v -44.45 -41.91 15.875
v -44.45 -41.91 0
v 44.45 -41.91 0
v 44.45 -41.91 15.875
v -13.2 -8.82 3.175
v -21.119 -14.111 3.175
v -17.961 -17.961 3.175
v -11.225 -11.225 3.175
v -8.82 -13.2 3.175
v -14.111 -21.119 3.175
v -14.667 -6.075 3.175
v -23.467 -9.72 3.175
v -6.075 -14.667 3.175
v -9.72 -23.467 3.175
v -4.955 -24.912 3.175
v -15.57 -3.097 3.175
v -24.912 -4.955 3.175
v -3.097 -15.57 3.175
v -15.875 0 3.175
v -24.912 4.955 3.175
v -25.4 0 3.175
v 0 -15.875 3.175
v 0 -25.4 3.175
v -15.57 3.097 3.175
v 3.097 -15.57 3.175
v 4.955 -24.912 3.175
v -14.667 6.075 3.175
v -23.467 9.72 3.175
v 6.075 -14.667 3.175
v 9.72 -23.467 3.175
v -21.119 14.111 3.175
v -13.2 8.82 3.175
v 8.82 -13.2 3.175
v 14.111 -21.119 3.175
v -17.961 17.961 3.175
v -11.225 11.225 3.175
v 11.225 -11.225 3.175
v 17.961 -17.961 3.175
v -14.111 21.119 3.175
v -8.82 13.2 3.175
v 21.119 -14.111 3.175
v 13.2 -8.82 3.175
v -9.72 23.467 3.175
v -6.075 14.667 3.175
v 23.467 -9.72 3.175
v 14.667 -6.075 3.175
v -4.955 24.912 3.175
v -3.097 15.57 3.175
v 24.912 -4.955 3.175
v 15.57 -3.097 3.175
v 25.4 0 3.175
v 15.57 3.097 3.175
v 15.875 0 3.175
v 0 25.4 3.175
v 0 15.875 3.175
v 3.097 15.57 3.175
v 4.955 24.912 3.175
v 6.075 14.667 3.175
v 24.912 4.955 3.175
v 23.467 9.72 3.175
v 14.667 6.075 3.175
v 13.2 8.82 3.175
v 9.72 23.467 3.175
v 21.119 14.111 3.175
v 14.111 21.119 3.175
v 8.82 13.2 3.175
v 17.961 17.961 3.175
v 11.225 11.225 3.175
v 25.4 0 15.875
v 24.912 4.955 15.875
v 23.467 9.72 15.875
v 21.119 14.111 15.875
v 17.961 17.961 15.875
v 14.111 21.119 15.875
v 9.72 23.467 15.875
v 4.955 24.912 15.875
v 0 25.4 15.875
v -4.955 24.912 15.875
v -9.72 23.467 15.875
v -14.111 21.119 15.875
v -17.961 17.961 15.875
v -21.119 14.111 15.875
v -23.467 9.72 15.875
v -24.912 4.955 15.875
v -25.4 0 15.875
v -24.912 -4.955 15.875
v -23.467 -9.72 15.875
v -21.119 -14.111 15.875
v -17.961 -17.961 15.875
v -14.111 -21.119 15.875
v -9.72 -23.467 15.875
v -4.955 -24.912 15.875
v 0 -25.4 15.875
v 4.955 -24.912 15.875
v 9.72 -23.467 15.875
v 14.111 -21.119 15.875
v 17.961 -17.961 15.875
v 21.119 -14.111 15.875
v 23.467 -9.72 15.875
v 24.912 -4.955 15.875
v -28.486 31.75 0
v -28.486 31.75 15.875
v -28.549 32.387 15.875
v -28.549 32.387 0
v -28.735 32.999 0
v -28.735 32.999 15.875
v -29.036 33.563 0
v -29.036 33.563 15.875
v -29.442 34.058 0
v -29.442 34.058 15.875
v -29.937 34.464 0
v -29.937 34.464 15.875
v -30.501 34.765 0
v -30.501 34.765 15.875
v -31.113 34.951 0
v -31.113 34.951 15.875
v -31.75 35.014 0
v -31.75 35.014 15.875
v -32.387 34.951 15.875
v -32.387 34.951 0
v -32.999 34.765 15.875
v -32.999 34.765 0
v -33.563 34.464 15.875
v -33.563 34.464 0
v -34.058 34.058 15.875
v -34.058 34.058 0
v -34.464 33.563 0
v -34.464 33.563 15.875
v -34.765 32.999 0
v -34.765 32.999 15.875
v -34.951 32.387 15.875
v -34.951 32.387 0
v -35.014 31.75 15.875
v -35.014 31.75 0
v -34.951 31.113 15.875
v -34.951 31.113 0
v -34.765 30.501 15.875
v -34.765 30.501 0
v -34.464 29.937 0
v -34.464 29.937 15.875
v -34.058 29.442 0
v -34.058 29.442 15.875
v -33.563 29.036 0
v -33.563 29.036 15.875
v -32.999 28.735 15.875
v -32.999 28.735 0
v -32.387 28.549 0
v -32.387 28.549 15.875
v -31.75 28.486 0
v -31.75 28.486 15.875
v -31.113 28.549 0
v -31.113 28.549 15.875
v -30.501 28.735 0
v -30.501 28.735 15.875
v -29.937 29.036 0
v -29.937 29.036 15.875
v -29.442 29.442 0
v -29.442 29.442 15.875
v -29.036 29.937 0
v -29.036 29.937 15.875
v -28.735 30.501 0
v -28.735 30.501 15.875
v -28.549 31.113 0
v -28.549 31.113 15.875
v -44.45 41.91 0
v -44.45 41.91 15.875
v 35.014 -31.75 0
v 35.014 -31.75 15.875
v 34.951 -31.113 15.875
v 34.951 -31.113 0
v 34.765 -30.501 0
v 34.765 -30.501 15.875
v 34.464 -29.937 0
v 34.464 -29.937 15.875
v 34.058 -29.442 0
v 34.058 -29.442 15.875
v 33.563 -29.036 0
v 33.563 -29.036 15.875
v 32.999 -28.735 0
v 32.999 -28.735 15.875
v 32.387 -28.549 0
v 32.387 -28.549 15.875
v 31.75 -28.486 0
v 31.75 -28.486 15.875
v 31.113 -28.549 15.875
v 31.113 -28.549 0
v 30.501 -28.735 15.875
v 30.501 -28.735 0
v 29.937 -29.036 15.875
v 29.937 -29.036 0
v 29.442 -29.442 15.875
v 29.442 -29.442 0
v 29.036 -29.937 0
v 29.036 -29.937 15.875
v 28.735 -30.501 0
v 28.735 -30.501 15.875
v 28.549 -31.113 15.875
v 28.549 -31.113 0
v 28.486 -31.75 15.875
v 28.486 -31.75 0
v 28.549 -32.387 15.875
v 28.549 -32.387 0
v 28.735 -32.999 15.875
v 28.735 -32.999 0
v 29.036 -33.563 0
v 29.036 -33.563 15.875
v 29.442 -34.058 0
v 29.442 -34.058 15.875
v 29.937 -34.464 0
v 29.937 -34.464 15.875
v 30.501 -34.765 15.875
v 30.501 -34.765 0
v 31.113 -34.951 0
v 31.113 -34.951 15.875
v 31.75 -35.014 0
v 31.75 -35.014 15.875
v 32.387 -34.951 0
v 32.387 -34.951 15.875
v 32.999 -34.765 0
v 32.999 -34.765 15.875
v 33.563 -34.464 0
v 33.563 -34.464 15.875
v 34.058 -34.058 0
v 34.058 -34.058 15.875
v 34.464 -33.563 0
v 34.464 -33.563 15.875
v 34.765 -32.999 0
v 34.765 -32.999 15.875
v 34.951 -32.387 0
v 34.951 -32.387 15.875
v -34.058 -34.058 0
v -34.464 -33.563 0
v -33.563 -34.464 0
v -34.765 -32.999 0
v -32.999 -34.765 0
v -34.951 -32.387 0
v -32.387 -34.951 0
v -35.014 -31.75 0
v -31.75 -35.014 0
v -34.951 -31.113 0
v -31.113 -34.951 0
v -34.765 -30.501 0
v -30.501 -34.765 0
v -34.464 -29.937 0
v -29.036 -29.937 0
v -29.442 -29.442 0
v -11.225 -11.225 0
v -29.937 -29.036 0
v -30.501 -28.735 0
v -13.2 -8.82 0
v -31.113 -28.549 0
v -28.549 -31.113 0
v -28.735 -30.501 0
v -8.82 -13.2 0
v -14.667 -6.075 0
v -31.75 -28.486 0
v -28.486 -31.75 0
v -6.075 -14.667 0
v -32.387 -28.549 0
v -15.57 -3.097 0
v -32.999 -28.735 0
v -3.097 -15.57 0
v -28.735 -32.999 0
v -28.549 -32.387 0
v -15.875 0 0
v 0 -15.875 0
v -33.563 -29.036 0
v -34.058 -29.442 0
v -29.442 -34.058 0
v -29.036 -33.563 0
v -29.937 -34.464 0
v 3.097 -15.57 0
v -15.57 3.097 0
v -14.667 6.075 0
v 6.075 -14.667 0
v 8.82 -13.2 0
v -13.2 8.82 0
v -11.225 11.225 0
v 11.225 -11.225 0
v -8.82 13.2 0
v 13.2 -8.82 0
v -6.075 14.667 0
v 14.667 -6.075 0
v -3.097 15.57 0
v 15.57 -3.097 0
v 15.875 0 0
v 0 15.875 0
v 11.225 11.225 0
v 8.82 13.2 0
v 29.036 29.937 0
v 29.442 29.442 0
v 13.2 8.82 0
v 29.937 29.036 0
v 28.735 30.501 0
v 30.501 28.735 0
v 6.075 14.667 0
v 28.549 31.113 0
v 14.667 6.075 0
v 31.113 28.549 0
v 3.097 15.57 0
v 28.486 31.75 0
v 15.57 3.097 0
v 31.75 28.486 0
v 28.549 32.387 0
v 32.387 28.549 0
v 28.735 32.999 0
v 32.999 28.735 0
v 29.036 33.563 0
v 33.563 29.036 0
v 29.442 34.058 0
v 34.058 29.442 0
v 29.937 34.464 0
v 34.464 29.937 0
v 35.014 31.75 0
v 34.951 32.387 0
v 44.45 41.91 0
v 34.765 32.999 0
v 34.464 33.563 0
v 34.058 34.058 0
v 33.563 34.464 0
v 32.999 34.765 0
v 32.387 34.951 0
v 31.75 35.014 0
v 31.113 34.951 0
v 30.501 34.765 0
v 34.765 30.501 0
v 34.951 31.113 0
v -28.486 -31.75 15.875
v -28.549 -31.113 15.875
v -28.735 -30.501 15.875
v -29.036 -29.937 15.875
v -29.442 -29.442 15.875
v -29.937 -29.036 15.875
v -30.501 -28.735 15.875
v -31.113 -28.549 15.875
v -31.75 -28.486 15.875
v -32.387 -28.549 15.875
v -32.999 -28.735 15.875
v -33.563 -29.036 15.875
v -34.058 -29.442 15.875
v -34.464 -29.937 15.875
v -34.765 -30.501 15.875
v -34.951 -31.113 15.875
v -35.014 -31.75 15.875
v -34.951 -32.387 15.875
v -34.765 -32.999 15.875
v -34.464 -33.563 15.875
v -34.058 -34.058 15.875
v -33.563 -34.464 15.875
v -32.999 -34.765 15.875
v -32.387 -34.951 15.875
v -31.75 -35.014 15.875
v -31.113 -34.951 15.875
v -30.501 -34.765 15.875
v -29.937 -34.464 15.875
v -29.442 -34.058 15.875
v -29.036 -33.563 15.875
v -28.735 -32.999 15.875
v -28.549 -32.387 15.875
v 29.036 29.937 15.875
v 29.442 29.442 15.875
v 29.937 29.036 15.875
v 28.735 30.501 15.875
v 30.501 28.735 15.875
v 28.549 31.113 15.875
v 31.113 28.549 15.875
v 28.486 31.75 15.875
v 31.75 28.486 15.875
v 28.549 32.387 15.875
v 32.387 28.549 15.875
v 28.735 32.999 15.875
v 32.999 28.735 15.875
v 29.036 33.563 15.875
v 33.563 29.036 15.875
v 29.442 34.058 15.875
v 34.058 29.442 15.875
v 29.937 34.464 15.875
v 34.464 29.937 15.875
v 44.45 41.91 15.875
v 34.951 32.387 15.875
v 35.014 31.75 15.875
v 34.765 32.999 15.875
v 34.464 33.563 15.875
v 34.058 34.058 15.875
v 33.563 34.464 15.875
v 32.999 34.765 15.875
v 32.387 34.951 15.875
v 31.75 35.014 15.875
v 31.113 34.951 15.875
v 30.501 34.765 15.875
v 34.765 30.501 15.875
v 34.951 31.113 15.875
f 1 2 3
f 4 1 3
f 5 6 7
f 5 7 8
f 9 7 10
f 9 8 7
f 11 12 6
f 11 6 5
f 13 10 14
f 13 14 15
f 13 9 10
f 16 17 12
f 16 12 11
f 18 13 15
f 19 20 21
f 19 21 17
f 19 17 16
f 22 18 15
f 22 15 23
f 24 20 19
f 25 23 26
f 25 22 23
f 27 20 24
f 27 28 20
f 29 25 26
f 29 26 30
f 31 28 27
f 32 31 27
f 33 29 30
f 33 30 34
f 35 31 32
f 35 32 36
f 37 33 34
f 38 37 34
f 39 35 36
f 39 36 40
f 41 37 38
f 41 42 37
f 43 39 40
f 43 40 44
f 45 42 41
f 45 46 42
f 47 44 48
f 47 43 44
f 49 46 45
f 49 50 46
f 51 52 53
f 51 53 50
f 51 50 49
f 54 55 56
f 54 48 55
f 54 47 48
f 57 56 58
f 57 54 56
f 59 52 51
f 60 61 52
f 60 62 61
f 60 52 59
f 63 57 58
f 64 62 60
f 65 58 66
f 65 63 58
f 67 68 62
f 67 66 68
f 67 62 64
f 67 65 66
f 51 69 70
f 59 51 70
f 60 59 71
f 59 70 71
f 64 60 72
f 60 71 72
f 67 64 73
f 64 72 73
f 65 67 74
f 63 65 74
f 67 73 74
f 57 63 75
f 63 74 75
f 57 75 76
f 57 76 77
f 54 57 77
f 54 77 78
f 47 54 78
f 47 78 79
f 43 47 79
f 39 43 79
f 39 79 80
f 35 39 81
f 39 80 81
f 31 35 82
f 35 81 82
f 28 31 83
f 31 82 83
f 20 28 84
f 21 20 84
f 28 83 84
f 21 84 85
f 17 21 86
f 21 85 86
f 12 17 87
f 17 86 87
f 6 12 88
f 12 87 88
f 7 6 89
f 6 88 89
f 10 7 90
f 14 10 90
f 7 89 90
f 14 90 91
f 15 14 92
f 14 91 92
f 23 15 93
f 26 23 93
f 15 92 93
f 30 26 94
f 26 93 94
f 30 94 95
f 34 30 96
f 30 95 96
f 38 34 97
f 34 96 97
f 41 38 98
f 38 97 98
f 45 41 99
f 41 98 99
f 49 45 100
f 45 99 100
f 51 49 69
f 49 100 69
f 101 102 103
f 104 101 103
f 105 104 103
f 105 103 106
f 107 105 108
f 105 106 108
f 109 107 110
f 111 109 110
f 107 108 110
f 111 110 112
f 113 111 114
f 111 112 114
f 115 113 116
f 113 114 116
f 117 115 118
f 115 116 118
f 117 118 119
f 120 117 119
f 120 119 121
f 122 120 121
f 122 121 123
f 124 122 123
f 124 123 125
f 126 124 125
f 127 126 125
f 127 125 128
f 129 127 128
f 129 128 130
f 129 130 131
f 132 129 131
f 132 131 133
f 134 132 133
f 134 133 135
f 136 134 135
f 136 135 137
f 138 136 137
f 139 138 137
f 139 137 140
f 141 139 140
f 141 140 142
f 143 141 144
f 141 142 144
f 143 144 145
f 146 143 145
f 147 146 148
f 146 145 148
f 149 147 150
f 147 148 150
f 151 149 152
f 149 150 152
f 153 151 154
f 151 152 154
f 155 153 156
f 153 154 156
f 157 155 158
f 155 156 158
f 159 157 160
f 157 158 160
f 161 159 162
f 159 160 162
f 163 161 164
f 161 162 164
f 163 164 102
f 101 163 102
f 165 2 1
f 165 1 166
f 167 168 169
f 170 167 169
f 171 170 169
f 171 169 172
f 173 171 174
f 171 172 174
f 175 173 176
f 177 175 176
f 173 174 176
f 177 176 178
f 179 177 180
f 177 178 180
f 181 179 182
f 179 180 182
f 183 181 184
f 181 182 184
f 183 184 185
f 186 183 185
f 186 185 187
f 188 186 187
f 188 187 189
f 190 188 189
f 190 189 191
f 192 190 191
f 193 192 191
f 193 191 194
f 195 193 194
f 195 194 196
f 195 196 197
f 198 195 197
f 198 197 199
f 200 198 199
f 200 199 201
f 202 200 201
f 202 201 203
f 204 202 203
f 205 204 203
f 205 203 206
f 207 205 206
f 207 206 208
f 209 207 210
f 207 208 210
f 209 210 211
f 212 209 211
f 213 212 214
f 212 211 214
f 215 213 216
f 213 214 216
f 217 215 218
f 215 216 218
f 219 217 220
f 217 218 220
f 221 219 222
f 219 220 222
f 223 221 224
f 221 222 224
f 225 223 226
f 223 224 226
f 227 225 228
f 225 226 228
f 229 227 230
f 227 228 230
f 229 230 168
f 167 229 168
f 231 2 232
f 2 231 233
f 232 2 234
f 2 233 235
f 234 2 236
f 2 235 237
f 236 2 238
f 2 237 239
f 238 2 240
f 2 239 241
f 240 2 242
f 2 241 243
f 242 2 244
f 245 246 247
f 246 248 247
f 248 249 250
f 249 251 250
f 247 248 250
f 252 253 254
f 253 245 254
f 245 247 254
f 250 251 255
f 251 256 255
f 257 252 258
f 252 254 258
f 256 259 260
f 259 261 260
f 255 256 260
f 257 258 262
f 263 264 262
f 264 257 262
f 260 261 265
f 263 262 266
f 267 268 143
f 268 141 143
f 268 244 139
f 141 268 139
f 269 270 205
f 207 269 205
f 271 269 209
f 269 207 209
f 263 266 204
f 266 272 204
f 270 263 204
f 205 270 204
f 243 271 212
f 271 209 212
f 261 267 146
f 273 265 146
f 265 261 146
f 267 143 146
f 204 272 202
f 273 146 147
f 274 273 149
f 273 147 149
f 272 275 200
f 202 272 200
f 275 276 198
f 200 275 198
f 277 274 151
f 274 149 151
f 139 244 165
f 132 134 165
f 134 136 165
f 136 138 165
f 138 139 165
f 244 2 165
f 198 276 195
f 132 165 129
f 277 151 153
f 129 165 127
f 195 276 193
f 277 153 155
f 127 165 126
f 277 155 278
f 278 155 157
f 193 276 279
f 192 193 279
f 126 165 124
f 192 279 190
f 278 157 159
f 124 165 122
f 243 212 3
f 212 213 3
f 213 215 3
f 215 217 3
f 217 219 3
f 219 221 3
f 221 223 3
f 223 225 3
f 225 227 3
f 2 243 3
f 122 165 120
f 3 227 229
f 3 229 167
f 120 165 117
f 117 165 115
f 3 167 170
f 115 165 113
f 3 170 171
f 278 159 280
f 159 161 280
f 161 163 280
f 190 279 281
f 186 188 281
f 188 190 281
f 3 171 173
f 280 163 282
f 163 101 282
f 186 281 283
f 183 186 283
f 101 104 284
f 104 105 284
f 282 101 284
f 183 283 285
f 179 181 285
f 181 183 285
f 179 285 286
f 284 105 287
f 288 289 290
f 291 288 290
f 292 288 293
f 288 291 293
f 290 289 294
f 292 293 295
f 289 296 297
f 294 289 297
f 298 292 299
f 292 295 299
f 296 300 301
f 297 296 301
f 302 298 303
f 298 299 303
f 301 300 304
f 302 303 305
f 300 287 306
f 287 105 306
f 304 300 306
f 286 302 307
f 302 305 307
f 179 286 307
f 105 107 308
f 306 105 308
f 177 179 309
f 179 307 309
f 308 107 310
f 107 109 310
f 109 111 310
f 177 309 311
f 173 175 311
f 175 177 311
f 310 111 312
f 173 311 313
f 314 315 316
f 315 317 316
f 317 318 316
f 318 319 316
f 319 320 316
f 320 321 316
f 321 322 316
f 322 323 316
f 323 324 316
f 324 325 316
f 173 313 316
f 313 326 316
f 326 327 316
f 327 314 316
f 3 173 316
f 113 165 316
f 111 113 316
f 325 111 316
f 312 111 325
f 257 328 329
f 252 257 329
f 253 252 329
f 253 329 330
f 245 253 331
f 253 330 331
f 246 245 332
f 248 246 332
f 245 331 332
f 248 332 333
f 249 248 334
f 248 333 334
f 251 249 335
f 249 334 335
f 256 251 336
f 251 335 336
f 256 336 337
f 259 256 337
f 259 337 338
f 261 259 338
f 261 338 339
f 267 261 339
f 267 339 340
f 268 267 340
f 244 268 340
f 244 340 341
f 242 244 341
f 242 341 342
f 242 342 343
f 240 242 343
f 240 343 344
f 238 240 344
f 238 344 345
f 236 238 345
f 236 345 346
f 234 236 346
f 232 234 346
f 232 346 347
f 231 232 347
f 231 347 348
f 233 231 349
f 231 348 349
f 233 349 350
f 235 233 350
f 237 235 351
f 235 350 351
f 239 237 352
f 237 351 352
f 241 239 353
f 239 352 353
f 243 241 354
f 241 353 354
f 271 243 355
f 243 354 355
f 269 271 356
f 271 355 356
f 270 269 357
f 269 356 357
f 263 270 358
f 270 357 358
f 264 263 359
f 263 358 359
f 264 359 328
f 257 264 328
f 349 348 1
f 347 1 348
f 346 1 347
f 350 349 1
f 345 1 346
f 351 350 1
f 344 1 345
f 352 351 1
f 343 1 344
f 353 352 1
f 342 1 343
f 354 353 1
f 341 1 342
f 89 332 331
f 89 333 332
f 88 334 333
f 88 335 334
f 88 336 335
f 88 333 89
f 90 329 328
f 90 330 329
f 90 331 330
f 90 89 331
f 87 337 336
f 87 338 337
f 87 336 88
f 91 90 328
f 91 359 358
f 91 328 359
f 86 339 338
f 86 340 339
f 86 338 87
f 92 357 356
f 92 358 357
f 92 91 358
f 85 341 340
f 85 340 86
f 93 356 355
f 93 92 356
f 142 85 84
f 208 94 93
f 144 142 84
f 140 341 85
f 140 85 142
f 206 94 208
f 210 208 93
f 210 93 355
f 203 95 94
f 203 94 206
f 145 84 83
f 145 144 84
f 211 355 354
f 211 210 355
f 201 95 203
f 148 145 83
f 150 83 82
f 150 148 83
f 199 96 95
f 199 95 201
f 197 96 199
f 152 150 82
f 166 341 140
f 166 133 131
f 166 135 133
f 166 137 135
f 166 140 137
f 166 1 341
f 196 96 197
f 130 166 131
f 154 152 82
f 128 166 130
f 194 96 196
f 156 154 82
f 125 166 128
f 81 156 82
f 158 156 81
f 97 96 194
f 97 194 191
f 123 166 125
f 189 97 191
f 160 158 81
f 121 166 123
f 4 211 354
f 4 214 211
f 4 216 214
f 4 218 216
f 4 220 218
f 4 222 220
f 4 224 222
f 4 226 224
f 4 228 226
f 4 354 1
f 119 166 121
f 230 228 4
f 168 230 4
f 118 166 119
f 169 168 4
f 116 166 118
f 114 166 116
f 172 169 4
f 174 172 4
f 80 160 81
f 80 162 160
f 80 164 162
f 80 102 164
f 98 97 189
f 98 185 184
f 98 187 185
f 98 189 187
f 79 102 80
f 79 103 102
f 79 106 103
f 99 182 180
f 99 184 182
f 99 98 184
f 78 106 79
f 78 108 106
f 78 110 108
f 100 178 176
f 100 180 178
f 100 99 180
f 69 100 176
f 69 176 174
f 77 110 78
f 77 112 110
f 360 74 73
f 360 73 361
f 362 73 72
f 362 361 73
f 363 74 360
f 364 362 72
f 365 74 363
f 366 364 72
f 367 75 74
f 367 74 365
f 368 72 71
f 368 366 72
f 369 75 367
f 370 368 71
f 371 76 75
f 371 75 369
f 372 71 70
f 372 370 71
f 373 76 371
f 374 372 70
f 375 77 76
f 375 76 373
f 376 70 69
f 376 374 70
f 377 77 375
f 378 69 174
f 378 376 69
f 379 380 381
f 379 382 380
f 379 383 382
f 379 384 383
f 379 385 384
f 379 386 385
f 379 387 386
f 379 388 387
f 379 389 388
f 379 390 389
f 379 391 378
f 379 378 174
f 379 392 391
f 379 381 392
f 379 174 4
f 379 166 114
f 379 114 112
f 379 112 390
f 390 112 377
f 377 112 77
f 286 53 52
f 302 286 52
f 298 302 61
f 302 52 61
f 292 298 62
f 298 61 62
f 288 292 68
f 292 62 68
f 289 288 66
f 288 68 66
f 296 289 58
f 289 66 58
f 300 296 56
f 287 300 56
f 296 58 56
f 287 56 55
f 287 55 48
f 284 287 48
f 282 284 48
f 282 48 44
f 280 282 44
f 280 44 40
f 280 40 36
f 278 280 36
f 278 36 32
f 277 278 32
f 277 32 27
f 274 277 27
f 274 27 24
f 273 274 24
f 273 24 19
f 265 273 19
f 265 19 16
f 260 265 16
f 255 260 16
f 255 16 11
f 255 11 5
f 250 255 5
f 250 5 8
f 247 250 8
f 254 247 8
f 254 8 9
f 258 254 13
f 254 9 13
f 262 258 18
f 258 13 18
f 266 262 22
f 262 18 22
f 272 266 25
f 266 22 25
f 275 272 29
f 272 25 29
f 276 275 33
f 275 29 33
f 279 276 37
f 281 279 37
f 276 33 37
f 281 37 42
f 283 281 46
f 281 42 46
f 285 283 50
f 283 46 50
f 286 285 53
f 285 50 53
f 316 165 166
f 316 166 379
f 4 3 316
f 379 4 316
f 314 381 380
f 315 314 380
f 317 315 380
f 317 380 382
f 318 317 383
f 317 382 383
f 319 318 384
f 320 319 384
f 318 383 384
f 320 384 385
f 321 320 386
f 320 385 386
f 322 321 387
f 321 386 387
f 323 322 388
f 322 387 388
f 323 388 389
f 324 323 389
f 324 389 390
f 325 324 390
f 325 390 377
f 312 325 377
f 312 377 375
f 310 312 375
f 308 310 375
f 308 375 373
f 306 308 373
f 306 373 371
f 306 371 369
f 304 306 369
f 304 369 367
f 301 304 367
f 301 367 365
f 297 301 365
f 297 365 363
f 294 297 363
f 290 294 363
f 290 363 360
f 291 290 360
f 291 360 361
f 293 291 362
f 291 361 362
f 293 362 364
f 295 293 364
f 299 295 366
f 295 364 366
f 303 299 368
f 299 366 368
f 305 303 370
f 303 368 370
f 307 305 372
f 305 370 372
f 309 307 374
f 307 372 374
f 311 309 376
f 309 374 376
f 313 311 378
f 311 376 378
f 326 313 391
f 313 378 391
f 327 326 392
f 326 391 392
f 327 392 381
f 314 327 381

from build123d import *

# Parameters (mm, degrees)
SKETCH1_W           = 88.9
SKETCH1_H           = 83.82
BOSS_EXTRUDE1_DEPTH = 15.875
SKETCH2_R           = 3.2639
SKETCH2_R_2         = 15.875
CUT_EXTRUDE1_DEPTH  = 16.875
SKETCH3_R           = 25.4
CUT_EXTRUDE2_DEPTH  = 12.7


with BuildPart() as part:
    # Sketch1 → Boss-Extrude1 (new body)
    with BuildSketch(Plane.XY):
        Rectangle(SKETCH1_W, SKETCH1_H)
    extrude(amount=BOSS_EXTRUDE1_DEPTH)

    # Sketch2 → Cut-Extrude1 (cut, through all)
    with BuildSketch(Plane.XY.offset(15.875)):
        with Locations((-31.75, 31.75)):
            Circle(SKETCH2_R)
        with Locations((31.75, 31.75)):
            Circle(SKETCH2_R)
        with Locations((31.75, -31.75)):
            Circle(SKETCH2_R)
        with Locations((-31.75, -31.75)):
            Circle(SKETCH2_R)
        Circle(SKETCH2_R_2)
    extrude(amount=-CUT_EXTRUDE1_DEPTH, mode=Mode.SUBTRACT)

    # Sketch3 → Cut-Extrude2 (cut)
    with BuildSketch(Plane.XY.offset(15.875)):
        Circle(SKETCH3_R)
    extrude(amount=-CUT_EXTRUDE2_DEPTH, mode=Mode.SUBTRACT)


solid = part.part
